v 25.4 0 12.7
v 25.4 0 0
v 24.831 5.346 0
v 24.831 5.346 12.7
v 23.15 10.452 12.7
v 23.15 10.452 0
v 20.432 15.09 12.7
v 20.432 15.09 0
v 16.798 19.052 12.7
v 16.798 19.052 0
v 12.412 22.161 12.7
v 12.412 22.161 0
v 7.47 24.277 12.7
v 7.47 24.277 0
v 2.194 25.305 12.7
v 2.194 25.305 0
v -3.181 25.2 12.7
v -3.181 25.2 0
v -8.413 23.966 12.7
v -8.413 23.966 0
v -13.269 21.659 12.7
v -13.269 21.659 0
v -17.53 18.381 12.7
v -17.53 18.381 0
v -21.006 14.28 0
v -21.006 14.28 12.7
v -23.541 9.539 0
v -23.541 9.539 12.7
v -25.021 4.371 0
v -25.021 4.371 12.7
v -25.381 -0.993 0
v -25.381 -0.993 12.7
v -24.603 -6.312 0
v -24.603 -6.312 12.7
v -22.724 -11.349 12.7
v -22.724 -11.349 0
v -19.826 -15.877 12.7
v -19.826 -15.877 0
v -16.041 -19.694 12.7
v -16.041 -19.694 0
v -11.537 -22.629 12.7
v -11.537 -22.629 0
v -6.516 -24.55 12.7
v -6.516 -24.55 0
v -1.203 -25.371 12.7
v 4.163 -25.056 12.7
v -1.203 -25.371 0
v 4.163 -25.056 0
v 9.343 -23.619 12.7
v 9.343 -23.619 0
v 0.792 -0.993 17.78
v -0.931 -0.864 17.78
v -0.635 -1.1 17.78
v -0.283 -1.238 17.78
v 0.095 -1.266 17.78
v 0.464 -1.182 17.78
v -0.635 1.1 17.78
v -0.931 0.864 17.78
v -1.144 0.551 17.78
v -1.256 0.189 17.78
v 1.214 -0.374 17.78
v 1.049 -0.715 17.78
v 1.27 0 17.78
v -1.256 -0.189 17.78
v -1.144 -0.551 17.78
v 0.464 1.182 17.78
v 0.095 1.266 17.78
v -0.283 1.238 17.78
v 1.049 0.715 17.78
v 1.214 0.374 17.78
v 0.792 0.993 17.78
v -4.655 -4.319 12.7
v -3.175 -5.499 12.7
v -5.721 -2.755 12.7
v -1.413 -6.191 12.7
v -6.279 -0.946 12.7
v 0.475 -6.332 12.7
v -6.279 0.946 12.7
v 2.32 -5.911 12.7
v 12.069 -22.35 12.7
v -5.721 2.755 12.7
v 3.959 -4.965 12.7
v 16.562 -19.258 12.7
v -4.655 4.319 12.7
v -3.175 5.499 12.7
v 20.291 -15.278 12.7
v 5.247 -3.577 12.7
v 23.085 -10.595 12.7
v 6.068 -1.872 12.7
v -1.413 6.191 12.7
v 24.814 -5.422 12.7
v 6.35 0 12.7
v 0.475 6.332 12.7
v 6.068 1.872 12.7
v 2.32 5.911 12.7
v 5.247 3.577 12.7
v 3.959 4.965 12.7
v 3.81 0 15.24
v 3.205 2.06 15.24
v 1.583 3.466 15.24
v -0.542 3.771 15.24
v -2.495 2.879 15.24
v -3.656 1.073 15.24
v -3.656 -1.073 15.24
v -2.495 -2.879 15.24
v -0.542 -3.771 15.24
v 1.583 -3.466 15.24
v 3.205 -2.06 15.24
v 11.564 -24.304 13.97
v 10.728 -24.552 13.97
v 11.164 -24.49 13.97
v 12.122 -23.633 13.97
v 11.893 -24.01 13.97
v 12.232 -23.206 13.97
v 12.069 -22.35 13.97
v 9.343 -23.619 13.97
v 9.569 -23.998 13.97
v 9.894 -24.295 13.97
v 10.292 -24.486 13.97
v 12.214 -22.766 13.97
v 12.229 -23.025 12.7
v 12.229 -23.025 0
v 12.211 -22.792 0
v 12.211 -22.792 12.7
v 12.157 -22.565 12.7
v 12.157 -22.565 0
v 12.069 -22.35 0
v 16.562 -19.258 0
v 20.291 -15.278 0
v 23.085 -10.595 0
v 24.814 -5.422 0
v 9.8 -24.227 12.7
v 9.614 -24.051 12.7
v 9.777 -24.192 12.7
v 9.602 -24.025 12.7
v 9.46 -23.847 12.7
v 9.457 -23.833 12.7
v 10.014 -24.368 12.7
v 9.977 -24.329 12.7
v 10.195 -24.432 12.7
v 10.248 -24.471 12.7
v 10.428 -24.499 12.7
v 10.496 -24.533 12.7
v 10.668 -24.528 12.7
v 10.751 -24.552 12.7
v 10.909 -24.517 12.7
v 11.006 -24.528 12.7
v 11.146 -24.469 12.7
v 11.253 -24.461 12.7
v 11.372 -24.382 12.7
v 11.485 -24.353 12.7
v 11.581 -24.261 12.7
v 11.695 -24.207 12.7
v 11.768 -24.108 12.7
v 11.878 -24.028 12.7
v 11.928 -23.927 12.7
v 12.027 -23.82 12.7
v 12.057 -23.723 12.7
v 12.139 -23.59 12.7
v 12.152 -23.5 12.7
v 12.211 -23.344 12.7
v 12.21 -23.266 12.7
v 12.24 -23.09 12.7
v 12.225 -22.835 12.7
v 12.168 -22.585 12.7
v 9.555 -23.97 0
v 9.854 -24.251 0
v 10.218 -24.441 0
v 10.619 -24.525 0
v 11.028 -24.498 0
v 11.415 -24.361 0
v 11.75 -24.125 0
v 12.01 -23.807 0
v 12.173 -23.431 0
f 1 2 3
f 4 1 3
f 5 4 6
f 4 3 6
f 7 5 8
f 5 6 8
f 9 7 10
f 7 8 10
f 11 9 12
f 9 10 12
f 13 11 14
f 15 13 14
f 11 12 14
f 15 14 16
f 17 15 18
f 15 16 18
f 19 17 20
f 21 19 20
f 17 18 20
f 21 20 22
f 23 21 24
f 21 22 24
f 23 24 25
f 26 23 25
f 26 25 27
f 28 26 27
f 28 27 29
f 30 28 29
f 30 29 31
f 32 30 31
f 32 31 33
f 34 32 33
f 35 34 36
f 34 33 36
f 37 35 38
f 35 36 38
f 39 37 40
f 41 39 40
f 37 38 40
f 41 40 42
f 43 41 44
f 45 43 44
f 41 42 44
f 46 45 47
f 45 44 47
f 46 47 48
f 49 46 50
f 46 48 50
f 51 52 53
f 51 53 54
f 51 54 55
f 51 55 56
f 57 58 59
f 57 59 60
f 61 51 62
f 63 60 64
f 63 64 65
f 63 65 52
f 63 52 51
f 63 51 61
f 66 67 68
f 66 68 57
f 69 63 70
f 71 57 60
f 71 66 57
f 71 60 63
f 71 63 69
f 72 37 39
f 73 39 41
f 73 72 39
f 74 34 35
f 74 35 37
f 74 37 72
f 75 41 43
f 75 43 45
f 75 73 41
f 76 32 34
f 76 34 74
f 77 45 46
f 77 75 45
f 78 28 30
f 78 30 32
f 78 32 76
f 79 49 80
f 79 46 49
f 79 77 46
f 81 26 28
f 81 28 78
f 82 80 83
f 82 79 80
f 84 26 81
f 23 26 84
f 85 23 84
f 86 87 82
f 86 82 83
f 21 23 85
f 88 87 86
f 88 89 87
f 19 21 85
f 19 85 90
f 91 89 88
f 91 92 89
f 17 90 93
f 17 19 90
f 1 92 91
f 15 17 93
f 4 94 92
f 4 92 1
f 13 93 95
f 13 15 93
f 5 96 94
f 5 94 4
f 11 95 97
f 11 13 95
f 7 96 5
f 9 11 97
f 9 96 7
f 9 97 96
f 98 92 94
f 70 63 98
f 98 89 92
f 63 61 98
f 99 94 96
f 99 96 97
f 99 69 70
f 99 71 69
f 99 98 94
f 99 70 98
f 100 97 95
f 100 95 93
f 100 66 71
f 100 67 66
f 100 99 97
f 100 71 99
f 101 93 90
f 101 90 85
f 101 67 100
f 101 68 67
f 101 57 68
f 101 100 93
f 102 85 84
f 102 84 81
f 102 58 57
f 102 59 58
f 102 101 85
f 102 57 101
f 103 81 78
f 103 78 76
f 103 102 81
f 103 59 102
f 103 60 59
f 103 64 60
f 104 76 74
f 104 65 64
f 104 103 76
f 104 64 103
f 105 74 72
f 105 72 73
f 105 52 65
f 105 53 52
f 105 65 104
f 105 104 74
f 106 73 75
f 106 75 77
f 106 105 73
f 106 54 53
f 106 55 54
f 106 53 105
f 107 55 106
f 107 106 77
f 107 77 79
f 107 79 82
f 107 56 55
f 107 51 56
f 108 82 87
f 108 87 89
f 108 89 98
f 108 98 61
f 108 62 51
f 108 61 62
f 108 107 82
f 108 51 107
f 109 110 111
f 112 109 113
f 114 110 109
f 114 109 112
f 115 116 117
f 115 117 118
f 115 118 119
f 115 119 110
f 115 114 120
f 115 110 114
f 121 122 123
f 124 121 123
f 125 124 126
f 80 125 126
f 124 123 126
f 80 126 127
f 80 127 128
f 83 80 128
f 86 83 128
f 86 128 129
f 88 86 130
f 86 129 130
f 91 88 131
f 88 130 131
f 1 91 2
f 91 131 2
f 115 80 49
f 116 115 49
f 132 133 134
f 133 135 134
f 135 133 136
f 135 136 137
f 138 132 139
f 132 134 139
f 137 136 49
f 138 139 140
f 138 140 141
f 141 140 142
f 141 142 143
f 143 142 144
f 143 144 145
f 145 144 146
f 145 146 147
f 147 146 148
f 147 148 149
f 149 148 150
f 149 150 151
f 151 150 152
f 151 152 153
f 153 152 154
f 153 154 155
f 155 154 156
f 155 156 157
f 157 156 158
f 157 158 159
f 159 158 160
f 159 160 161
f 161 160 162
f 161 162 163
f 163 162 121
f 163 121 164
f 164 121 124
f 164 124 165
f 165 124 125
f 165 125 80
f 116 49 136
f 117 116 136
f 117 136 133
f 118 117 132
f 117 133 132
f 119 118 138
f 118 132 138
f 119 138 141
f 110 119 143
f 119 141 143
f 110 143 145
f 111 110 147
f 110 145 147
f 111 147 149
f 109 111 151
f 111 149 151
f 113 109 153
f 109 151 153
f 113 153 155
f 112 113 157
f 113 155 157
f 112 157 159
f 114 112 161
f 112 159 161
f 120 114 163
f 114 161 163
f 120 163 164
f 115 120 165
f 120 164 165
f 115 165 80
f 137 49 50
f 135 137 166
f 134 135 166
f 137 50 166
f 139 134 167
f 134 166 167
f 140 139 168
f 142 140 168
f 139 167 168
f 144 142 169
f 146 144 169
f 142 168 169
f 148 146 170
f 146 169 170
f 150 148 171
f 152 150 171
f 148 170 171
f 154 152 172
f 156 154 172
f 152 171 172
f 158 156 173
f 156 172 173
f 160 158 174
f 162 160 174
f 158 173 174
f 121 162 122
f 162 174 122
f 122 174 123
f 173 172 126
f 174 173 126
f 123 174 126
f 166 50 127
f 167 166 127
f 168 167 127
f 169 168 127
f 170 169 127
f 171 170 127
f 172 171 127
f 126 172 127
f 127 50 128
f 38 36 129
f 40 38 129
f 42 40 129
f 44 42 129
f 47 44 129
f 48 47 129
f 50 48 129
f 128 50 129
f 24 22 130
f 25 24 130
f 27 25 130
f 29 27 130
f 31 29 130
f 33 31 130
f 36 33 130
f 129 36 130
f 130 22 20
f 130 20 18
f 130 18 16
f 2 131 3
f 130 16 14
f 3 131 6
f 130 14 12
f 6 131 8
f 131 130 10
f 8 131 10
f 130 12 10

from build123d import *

# Parameters (mm, degrees)
F0_R     = 6.35
F1_DEPTH = 12.7
F2_DEPTH = 17.78
F3_SIZE  = 5.07999
F5_DEPTH = 1.27


# Not quite as in the source:
# - a fillet or chamfer is up to 0.001 mm smaller than in the source, because OpenCascade refuses the exact size


with BuildPart() as f1:
    # F0 (on Top) → F1 (new body)
    with BuildSketch(Plane.XY):
        with BuildLine():
            ThreePointArc((12.068946544, -22.3495084805), (21.8141151805, -13.011701614), (25.4, 0))
            ThreePointArc((25.4, 0), (-21.0057565892, 14.2799926511), (9.3434495971, -23.6190590335))
            ThreePointArc((9.3434495971, -23.6190590335), (10.0899459577, -21.6613011879), (12.068946544, -22.3495084805))
        make_face()
        Circle(F0_R, mode=Mode.SUBTRACT)
        with BuildLine():
            ThreePointArc((12.068946544, -22.3495084805), (10.0899459577, -21.6613011879), (9.3434495971, -23.6190590335))
            ThreePointArc((9.3434495971, -23.6190590335), (10.7249996167, -23.0246472986), (12.068946544, -22.3495084805))
        make_face()
        with BuildLine():
            ThreePointArc((12.068946544, -22.3495084805), (10.7249996167, -23.0246472986), (9.3434495971, -23.6190590335))
            ThreePointArc((9.3434495971, -23.6190590335), (11.0284458537, -24.4977142177), (12.2289962148, -23.0246472986))
            ThreePointArc((12.2289962148, -23.0246472986), (12.1884369016, -22.677722119), (12.068946544, -22.3495084805))
        make_face()
    extrude(amount=F1_DEPTH)

    # F0 (on Top) → F2 (join)
    with BuildSketch(Plane.XY):
        Circle(F0_R)
    extrude(amount=F2_DEPTH)

    # F3 (size 5.08 in the source; OpenCascade refuses exactly that, so slightly less here)
    f3_edges = [f1.edges().sort_by_distance(p)[0] for p in [
        (-6.35, 0, 17.78),
    ]]
    chamfer(f3_edges, length=F3_SIZE)

    # F4 (on face) → F5 (join)
    with BuildSketch(Plane.XY.offset(12.7)):
        with BuildLine():
            Line((12.068946544, -22.3495084805), (9.3434495971, -23.6190590335))
            ThreePointArc((9.3434495971, -23.6190590335), (11.3711055832, -24.4117207278), (12.068946544, -22.3495084805))
        make_face()
    extrude(amount=F5_DEPTH)


solid = f1.part
